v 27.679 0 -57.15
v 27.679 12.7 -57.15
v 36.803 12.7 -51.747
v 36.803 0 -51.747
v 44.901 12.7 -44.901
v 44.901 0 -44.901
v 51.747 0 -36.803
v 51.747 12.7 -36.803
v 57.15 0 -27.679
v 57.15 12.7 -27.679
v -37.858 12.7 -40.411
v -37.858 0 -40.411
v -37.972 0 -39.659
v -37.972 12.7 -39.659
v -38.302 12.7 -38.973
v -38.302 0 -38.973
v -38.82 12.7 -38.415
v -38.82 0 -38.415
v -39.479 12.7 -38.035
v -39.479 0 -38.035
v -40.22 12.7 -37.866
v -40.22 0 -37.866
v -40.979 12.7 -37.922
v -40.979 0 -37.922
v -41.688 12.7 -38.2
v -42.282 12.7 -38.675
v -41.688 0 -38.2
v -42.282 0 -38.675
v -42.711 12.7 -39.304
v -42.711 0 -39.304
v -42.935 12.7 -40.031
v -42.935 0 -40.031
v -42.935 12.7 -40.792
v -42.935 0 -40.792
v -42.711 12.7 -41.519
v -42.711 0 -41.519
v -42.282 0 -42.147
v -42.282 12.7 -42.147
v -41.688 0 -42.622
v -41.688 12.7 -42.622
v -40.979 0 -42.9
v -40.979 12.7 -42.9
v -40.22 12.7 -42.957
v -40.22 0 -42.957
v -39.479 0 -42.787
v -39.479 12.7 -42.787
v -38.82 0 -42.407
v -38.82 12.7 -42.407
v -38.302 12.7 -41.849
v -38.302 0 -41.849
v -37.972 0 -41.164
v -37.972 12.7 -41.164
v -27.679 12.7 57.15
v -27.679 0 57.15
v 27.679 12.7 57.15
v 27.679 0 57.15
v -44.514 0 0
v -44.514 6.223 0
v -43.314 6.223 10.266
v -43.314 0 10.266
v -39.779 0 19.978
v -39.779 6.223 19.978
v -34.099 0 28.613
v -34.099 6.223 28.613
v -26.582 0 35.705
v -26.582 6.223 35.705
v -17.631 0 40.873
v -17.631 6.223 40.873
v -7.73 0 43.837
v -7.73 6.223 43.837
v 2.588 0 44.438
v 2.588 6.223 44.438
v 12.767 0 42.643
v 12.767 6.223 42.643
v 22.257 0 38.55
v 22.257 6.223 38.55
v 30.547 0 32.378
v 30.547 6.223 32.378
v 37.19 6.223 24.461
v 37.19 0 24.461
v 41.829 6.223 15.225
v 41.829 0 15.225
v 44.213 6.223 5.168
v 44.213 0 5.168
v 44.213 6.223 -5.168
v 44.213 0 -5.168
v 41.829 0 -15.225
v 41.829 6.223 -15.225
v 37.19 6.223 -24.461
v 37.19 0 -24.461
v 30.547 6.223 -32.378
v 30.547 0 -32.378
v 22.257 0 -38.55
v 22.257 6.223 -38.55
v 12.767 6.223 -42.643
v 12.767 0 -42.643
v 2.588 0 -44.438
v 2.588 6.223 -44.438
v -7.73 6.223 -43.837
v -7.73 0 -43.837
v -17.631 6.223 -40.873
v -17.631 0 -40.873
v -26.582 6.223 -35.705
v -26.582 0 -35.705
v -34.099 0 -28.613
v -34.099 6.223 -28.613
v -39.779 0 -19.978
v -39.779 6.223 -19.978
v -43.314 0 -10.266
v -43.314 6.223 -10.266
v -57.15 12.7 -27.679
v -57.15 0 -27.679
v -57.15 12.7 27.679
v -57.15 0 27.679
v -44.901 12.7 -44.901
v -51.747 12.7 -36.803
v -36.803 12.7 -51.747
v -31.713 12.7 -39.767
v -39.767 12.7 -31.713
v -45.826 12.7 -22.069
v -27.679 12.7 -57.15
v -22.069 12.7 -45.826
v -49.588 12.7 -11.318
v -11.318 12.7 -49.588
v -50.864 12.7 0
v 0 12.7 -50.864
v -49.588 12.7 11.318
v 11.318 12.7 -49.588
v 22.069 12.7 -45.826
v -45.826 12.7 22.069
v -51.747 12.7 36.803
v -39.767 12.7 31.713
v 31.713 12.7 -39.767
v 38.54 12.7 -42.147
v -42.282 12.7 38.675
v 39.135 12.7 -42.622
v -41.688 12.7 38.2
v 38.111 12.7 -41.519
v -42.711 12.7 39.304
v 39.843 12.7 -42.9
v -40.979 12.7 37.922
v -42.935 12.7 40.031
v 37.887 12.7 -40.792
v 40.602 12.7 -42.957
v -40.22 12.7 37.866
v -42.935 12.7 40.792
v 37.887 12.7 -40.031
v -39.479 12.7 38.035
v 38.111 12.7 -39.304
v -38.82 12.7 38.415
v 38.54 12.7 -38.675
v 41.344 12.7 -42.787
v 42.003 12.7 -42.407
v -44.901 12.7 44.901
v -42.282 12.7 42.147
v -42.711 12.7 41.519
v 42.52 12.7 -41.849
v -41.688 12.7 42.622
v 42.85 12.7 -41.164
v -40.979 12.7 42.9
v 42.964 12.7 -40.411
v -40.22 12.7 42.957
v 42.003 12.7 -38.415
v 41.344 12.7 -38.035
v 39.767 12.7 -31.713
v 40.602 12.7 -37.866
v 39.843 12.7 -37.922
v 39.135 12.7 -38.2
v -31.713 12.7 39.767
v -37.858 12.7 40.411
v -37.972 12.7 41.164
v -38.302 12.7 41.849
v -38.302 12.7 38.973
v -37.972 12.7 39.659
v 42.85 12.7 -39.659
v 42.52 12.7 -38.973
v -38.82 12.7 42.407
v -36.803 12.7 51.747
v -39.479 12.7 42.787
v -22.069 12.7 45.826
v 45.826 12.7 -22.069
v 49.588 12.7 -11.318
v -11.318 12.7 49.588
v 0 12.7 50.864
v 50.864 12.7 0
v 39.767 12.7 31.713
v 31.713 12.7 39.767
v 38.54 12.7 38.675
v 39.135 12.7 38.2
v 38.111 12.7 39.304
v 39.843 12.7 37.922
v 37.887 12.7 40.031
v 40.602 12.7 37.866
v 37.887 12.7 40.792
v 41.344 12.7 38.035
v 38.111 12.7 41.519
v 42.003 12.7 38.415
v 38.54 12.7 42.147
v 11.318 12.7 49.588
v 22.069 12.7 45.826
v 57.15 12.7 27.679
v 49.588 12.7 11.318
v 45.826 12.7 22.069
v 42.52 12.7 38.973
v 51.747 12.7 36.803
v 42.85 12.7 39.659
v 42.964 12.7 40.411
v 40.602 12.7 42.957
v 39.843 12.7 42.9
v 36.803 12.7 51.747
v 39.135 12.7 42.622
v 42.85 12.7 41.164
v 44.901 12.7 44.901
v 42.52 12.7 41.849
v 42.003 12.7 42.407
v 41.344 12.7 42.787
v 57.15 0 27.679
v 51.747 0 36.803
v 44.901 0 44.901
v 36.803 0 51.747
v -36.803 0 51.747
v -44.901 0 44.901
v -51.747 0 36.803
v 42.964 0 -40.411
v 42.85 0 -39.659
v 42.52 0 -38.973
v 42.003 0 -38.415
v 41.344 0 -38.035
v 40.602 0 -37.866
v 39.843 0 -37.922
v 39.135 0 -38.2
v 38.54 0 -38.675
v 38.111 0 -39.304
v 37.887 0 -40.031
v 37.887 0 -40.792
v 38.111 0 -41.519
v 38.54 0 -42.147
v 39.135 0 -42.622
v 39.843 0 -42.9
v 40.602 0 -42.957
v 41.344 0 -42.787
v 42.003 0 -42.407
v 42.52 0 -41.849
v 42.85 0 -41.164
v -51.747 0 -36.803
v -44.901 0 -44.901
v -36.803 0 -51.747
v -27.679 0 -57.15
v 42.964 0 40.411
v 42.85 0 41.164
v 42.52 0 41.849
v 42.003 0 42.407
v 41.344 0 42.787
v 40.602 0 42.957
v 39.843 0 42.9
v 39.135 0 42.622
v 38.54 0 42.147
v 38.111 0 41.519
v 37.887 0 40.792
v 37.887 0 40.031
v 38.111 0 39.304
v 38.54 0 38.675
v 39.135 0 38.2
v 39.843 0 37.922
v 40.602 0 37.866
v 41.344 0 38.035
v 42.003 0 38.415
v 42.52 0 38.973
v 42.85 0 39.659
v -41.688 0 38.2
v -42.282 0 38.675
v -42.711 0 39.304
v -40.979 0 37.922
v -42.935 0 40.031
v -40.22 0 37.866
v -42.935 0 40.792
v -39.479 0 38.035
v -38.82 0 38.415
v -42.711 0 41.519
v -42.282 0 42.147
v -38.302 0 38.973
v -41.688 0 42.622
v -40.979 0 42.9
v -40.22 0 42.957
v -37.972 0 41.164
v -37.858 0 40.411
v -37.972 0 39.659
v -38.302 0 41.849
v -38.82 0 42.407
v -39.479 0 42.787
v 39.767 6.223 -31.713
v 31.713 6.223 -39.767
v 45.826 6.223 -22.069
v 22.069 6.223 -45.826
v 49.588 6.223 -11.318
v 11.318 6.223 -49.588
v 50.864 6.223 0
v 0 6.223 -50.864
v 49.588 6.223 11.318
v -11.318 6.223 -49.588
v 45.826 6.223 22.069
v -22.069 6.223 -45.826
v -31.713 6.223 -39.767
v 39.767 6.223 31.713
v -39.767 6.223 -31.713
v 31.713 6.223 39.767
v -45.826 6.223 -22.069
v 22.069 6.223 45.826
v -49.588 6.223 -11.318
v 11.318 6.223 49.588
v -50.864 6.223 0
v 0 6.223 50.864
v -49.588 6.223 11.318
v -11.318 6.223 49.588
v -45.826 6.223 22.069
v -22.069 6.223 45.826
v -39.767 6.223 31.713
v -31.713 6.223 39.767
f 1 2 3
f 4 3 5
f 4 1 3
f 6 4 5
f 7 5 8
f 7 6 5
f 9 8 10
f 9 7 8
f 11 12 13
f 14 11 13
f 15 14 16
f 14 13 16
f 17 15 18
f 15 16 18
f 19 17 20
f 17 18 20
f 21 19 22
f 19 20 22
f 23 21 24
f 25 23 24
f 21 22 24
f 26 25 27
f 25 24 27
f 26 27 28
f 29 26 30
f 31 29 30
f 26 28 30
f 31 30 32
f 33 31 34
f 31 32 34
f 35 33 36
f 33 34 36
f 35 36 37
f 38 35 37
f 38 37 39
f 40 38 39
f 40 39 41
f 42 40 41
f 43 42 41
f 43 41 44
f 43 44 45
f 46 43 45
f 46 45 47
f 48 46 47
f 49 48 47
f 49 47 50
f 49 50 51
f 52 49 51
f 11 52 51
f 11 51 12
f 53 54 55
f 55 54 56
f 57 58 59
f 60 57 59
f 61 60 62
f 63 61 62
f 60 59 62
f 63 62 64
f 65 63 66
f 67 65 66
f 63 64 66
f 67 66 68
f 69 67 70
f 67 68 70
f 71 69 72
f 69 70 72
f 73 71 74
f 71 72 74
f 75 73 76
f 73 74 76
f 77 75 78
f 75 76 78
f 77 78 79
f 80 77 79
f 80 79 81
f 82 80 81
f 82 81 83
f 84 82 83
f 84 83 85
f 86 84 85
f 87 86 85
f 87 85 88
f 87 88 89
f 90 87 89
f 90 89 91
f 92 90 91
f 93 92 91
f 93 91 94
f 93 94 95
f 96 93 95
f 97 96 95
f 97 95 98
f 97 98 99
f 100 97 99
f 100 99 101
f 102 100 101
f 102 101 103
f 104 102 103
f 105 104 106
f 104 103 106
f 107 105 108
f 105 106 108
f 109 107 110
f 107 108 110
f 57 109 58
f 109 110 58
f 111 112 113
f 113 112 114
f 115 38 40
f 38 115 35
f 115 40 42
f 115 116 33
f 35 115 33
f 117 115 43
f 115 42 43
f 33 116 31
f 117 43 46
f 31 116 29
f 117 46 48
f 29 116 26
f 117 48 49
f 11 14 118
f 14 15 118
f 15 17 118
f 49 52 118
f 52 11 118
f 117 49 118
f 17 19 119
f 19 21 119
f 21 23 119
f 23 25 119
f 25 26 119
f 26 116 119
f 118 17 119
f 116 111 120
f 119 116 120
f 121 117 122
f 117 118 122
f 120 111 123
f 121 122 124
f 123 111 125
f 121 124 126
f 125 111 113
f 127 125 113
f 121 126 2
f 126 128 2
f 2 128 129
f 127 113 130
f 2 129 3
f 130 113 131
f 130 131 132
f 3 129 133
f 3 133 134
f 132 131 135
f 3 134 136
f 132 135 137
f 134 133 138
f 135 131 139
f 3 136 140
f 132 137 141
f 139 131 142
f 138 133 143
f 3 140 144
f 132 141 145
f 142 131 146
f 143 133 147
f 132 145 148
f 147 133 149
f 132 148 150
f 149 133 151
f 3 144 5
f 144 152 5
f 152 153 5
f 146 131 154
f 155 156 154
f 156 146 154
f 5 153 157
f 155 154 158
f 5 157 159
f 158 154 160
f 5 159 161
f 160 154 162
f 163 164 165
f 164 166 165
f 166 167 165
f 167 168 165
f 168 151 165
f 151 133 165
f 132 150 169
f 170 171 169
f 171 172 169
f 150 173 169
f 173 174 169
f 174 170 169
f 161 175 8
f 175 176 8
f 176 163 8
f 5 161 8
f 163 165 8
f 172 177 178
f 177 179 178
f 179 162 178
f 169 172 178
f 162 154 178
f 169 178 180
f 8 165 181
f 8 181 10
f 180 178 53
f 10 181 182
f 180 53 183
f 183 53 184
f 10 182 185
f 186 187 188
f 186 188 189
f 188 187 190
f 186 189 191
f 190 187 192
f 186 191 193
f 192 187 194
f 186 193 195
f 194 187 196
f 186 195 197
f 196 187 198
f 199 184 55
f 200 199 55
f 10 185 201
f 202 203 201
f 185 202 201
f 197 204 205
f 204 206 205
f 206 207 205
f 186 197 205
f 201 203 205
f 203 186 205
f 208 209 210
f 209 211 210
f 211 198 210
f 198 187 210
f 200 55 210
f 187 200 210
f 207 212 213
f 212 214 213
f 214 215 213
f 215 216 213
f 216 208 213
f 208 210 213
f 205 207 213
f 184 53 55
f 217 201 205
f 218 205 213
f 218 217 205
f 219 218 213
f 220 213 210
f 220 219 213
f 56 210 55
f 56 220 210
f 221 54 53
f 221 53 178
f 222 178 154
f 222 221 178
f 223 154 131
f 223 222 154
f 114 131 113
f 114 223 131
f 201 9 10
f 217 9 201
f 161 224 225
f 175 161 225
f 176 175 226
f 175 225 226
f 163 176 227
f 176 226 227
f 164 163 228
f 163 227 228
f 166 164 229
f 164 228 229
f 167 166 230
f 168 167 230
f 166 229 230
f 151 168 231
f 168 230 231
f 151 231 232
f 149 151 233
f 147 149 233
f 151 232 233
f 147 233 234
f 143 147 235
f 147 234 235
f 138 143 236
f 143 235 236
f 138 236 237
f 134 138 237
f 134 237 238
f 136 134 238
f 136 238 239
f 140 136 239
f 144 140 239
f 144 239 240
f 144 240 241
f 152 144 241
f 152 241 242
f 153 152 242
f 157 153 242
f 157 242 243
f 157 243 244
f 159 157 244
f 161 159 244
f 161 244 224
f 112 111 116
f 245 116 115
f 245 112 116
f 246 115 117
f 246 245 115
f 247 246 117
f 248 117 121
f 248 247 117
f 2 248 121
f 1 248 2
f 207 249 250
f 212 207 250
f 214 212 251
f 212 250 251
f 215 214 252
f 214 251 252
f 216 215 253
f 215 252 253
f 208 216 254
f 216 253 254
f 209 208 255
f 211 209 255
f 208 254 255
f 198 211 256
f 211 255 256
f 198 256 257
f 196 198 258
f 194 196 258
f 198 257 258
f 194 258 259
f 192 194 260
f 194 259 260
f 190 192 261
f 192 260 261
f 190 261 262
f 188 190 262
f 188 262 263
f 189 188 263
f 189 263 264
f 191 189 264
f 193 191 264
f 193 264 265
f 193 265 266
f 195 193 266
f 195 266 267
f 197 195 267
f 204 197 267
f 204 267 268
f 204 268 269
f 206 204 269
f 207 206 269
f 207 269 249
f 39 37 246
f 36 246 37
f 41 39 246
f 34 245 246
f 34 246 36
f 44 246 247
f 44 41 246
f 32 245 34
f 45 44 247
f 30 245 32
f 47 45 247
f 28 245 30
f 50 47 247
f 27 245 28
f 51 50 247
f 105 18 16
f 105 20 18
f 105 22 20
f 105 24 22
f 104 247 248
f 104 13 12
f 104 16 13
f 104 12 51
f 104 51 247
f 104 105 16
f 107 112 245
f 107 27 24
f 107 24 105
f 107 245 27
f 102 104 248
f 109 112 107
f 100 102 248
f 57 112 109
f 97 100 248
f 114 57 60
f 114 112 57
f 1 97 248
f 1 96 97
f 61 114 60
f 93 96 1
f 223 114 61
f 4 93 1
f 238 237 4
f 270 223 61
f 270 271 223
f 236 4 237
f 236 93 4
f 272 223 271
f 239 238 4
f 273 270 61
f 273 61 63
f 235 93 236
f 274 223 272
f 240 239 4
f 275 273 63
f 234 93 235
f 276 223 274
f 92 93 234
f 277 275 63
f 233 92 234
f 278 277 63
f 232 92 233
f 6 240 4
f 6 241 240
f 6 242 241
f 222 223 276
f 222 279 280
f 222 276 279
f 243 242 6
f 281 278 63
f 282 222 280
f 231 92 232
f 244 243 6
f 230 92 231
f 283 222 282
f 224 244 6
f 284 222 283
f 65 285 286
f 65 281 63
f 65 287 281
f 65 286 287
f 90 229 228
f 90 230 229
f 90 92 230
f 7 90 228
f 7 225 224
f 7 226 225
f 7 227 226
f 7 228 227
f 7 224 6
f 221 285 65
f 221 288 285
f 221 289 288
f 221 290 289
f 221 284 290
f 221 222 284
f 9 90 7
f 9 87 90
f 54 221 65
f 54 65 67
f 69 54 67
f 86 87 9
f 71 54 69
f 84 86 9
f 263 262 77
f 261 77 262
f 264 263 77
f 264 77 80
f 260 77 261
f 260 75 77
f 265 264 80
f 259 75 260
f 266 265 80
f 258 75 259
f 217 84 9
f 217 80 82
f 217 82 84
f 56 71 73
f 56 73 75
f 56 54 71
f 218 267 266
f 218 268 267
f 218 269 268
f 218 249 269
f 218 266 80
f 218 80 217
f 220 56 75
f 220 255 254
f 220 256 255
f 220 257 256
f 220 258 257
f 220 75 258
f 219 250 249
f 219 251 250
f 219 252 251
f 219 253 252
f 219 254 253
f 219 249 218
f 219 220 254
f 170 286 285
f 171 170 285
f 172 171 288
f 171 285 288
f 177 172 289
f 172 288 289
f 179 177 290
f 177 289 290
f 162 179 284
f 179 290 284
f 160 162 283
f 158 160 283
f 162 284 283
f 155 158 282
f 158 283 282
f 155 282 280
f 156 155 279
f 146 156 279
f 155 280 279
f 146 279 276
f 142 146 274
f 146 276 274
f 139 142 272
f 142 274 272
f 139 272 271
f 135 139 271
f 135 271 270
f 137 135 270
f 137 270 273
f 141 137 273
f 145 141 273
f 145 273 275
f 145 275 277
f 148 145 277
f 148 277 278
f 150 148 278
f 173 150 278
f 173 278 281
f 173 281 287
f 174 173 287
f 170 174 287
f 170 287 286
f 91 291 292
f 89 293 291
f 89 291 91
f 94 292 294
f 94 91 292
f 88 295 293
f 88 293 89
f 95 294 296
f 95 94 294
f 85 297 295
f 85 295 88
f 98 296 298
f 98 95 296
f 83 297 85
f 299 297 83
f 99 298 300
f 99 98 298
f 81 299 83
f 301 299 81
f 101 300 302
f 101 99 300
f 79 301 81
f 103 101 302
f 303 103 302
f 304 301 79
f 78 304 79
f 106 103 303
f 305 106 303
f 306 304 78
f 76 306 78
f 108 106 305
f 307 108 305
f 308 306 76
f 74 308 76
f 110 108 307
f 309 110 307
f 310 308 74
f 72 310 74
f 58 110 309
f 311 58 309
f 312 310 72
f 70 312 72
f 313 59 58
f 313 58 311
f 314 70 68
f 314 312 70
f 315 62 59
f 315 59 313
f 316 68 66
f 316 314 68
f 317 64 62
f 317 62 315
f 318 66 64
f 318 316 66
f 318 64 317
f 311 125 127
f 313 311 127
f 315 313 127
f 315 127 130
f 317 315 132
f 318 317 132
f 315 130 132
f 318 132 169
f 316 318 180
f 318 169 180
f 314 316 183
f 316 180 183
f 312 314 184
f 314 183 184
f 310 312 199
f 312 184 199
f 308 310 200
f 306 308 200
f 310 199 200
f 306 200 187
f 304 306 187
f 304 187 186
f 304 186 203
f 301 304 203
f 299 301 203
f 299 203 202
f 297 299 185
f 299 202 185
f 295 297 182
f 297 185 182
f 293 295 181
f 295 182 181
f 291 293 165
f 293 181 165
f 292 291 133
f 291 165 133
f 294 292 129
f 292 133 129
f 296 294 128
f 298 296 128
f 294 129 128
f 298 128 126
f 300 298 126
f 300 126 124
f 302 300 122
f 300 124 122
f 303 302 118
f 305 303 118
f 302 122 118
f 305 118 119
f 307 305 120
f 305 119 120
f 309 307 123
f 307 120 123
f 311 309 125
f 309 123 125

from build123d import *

# Parameters (mm, degrees)
F0_W      = 114.3
F0_H      = 114.3
F1_DEPTH  = 12.7
F2_R      = 50.8635
F3_DEPTH  = 6.477
F4_R      = 44.5135
F5_DEPTH  = 6.224
F6_R      = 9.525
F8_D      = 5.1054
F9_R      = 110.5427806282
F9_R_2    = 63.5
F10_DEPTH = 25.4
F12_D     = 5.1054


with BuildPart() as f1:
    # F0 (on Front) → F1 (new body)
    with BuildSketch(Plane.XZ):
        Rectangle(F0_W, F0_H)
    extrude(amount=-F1_DEPTH)

    # F2 (on face) → F3 (cut)
    with BuildSketch(Plane(origin=(0, 12.7, 0), x_dir=(-1, 0, 0), z_dir=(0, 1, 0))):
        Circle(F2_R)
    extrude(amount=-F3_DEPTH, mode=Mode.SUBTRACT)

    # F4 (on face) → F5 (cut, through all)
    with BuildSketch(Plane(origin=(0, 6.223, 0), x_dir=(-1, 0, 0), z_dir=(0, 1, 0))):
        Circle(F4_R)
    extrude(amount=-F5_DEPTH, mode=Mode.SUBTRACT)

    # F6
    f6_edges = [f1.edges().sort_by_distance(p)[0] for p in [
        (57.15, 6.35, 57.15),
        (-57.15, 6.35, 57.15),
        (57.15, 6.35, -57.15),
        (-57.15, 6.35, -57.15),
    ]]
    fillet(f6_edges, radius=F6_R)

    # F8 (through all)
    with Locations(Plane(origin=(0, 12.7, 0), x_dir=(-1, 0, 0), z_dir=(0, 1, 0))):
        with Locations((-47.625, 47.625), (47.625, -47.625), (47.625, 47.625), (-47.625, -47.625)):
            Hole(F8_D / 2)

    # F9 (on Front) → F10 (cut)
    with BuildSketch(Plane.XZ):
        Circle(F9_R)
        Circle(F9_R_2, mode=Mode.SUBTRACT)
    extrude(amount=-F10_DEPTH, mode=Mode.SUBTRACT)

    # F12 (through all)
    with Locations(Plane(origin=(0, 12.7, 0), x_dir=(-1, 0, 0), z_dir=(0, 1, 0))):
        with Locations((40.4111525448, 40.4111525448), (-40.4111525448, 40.4111525448), (-40.4111525448, -40.4111525448), (40.4111525448, -40.4111525448)):
            Hole(F12_D / 2)


solid = f1.part
